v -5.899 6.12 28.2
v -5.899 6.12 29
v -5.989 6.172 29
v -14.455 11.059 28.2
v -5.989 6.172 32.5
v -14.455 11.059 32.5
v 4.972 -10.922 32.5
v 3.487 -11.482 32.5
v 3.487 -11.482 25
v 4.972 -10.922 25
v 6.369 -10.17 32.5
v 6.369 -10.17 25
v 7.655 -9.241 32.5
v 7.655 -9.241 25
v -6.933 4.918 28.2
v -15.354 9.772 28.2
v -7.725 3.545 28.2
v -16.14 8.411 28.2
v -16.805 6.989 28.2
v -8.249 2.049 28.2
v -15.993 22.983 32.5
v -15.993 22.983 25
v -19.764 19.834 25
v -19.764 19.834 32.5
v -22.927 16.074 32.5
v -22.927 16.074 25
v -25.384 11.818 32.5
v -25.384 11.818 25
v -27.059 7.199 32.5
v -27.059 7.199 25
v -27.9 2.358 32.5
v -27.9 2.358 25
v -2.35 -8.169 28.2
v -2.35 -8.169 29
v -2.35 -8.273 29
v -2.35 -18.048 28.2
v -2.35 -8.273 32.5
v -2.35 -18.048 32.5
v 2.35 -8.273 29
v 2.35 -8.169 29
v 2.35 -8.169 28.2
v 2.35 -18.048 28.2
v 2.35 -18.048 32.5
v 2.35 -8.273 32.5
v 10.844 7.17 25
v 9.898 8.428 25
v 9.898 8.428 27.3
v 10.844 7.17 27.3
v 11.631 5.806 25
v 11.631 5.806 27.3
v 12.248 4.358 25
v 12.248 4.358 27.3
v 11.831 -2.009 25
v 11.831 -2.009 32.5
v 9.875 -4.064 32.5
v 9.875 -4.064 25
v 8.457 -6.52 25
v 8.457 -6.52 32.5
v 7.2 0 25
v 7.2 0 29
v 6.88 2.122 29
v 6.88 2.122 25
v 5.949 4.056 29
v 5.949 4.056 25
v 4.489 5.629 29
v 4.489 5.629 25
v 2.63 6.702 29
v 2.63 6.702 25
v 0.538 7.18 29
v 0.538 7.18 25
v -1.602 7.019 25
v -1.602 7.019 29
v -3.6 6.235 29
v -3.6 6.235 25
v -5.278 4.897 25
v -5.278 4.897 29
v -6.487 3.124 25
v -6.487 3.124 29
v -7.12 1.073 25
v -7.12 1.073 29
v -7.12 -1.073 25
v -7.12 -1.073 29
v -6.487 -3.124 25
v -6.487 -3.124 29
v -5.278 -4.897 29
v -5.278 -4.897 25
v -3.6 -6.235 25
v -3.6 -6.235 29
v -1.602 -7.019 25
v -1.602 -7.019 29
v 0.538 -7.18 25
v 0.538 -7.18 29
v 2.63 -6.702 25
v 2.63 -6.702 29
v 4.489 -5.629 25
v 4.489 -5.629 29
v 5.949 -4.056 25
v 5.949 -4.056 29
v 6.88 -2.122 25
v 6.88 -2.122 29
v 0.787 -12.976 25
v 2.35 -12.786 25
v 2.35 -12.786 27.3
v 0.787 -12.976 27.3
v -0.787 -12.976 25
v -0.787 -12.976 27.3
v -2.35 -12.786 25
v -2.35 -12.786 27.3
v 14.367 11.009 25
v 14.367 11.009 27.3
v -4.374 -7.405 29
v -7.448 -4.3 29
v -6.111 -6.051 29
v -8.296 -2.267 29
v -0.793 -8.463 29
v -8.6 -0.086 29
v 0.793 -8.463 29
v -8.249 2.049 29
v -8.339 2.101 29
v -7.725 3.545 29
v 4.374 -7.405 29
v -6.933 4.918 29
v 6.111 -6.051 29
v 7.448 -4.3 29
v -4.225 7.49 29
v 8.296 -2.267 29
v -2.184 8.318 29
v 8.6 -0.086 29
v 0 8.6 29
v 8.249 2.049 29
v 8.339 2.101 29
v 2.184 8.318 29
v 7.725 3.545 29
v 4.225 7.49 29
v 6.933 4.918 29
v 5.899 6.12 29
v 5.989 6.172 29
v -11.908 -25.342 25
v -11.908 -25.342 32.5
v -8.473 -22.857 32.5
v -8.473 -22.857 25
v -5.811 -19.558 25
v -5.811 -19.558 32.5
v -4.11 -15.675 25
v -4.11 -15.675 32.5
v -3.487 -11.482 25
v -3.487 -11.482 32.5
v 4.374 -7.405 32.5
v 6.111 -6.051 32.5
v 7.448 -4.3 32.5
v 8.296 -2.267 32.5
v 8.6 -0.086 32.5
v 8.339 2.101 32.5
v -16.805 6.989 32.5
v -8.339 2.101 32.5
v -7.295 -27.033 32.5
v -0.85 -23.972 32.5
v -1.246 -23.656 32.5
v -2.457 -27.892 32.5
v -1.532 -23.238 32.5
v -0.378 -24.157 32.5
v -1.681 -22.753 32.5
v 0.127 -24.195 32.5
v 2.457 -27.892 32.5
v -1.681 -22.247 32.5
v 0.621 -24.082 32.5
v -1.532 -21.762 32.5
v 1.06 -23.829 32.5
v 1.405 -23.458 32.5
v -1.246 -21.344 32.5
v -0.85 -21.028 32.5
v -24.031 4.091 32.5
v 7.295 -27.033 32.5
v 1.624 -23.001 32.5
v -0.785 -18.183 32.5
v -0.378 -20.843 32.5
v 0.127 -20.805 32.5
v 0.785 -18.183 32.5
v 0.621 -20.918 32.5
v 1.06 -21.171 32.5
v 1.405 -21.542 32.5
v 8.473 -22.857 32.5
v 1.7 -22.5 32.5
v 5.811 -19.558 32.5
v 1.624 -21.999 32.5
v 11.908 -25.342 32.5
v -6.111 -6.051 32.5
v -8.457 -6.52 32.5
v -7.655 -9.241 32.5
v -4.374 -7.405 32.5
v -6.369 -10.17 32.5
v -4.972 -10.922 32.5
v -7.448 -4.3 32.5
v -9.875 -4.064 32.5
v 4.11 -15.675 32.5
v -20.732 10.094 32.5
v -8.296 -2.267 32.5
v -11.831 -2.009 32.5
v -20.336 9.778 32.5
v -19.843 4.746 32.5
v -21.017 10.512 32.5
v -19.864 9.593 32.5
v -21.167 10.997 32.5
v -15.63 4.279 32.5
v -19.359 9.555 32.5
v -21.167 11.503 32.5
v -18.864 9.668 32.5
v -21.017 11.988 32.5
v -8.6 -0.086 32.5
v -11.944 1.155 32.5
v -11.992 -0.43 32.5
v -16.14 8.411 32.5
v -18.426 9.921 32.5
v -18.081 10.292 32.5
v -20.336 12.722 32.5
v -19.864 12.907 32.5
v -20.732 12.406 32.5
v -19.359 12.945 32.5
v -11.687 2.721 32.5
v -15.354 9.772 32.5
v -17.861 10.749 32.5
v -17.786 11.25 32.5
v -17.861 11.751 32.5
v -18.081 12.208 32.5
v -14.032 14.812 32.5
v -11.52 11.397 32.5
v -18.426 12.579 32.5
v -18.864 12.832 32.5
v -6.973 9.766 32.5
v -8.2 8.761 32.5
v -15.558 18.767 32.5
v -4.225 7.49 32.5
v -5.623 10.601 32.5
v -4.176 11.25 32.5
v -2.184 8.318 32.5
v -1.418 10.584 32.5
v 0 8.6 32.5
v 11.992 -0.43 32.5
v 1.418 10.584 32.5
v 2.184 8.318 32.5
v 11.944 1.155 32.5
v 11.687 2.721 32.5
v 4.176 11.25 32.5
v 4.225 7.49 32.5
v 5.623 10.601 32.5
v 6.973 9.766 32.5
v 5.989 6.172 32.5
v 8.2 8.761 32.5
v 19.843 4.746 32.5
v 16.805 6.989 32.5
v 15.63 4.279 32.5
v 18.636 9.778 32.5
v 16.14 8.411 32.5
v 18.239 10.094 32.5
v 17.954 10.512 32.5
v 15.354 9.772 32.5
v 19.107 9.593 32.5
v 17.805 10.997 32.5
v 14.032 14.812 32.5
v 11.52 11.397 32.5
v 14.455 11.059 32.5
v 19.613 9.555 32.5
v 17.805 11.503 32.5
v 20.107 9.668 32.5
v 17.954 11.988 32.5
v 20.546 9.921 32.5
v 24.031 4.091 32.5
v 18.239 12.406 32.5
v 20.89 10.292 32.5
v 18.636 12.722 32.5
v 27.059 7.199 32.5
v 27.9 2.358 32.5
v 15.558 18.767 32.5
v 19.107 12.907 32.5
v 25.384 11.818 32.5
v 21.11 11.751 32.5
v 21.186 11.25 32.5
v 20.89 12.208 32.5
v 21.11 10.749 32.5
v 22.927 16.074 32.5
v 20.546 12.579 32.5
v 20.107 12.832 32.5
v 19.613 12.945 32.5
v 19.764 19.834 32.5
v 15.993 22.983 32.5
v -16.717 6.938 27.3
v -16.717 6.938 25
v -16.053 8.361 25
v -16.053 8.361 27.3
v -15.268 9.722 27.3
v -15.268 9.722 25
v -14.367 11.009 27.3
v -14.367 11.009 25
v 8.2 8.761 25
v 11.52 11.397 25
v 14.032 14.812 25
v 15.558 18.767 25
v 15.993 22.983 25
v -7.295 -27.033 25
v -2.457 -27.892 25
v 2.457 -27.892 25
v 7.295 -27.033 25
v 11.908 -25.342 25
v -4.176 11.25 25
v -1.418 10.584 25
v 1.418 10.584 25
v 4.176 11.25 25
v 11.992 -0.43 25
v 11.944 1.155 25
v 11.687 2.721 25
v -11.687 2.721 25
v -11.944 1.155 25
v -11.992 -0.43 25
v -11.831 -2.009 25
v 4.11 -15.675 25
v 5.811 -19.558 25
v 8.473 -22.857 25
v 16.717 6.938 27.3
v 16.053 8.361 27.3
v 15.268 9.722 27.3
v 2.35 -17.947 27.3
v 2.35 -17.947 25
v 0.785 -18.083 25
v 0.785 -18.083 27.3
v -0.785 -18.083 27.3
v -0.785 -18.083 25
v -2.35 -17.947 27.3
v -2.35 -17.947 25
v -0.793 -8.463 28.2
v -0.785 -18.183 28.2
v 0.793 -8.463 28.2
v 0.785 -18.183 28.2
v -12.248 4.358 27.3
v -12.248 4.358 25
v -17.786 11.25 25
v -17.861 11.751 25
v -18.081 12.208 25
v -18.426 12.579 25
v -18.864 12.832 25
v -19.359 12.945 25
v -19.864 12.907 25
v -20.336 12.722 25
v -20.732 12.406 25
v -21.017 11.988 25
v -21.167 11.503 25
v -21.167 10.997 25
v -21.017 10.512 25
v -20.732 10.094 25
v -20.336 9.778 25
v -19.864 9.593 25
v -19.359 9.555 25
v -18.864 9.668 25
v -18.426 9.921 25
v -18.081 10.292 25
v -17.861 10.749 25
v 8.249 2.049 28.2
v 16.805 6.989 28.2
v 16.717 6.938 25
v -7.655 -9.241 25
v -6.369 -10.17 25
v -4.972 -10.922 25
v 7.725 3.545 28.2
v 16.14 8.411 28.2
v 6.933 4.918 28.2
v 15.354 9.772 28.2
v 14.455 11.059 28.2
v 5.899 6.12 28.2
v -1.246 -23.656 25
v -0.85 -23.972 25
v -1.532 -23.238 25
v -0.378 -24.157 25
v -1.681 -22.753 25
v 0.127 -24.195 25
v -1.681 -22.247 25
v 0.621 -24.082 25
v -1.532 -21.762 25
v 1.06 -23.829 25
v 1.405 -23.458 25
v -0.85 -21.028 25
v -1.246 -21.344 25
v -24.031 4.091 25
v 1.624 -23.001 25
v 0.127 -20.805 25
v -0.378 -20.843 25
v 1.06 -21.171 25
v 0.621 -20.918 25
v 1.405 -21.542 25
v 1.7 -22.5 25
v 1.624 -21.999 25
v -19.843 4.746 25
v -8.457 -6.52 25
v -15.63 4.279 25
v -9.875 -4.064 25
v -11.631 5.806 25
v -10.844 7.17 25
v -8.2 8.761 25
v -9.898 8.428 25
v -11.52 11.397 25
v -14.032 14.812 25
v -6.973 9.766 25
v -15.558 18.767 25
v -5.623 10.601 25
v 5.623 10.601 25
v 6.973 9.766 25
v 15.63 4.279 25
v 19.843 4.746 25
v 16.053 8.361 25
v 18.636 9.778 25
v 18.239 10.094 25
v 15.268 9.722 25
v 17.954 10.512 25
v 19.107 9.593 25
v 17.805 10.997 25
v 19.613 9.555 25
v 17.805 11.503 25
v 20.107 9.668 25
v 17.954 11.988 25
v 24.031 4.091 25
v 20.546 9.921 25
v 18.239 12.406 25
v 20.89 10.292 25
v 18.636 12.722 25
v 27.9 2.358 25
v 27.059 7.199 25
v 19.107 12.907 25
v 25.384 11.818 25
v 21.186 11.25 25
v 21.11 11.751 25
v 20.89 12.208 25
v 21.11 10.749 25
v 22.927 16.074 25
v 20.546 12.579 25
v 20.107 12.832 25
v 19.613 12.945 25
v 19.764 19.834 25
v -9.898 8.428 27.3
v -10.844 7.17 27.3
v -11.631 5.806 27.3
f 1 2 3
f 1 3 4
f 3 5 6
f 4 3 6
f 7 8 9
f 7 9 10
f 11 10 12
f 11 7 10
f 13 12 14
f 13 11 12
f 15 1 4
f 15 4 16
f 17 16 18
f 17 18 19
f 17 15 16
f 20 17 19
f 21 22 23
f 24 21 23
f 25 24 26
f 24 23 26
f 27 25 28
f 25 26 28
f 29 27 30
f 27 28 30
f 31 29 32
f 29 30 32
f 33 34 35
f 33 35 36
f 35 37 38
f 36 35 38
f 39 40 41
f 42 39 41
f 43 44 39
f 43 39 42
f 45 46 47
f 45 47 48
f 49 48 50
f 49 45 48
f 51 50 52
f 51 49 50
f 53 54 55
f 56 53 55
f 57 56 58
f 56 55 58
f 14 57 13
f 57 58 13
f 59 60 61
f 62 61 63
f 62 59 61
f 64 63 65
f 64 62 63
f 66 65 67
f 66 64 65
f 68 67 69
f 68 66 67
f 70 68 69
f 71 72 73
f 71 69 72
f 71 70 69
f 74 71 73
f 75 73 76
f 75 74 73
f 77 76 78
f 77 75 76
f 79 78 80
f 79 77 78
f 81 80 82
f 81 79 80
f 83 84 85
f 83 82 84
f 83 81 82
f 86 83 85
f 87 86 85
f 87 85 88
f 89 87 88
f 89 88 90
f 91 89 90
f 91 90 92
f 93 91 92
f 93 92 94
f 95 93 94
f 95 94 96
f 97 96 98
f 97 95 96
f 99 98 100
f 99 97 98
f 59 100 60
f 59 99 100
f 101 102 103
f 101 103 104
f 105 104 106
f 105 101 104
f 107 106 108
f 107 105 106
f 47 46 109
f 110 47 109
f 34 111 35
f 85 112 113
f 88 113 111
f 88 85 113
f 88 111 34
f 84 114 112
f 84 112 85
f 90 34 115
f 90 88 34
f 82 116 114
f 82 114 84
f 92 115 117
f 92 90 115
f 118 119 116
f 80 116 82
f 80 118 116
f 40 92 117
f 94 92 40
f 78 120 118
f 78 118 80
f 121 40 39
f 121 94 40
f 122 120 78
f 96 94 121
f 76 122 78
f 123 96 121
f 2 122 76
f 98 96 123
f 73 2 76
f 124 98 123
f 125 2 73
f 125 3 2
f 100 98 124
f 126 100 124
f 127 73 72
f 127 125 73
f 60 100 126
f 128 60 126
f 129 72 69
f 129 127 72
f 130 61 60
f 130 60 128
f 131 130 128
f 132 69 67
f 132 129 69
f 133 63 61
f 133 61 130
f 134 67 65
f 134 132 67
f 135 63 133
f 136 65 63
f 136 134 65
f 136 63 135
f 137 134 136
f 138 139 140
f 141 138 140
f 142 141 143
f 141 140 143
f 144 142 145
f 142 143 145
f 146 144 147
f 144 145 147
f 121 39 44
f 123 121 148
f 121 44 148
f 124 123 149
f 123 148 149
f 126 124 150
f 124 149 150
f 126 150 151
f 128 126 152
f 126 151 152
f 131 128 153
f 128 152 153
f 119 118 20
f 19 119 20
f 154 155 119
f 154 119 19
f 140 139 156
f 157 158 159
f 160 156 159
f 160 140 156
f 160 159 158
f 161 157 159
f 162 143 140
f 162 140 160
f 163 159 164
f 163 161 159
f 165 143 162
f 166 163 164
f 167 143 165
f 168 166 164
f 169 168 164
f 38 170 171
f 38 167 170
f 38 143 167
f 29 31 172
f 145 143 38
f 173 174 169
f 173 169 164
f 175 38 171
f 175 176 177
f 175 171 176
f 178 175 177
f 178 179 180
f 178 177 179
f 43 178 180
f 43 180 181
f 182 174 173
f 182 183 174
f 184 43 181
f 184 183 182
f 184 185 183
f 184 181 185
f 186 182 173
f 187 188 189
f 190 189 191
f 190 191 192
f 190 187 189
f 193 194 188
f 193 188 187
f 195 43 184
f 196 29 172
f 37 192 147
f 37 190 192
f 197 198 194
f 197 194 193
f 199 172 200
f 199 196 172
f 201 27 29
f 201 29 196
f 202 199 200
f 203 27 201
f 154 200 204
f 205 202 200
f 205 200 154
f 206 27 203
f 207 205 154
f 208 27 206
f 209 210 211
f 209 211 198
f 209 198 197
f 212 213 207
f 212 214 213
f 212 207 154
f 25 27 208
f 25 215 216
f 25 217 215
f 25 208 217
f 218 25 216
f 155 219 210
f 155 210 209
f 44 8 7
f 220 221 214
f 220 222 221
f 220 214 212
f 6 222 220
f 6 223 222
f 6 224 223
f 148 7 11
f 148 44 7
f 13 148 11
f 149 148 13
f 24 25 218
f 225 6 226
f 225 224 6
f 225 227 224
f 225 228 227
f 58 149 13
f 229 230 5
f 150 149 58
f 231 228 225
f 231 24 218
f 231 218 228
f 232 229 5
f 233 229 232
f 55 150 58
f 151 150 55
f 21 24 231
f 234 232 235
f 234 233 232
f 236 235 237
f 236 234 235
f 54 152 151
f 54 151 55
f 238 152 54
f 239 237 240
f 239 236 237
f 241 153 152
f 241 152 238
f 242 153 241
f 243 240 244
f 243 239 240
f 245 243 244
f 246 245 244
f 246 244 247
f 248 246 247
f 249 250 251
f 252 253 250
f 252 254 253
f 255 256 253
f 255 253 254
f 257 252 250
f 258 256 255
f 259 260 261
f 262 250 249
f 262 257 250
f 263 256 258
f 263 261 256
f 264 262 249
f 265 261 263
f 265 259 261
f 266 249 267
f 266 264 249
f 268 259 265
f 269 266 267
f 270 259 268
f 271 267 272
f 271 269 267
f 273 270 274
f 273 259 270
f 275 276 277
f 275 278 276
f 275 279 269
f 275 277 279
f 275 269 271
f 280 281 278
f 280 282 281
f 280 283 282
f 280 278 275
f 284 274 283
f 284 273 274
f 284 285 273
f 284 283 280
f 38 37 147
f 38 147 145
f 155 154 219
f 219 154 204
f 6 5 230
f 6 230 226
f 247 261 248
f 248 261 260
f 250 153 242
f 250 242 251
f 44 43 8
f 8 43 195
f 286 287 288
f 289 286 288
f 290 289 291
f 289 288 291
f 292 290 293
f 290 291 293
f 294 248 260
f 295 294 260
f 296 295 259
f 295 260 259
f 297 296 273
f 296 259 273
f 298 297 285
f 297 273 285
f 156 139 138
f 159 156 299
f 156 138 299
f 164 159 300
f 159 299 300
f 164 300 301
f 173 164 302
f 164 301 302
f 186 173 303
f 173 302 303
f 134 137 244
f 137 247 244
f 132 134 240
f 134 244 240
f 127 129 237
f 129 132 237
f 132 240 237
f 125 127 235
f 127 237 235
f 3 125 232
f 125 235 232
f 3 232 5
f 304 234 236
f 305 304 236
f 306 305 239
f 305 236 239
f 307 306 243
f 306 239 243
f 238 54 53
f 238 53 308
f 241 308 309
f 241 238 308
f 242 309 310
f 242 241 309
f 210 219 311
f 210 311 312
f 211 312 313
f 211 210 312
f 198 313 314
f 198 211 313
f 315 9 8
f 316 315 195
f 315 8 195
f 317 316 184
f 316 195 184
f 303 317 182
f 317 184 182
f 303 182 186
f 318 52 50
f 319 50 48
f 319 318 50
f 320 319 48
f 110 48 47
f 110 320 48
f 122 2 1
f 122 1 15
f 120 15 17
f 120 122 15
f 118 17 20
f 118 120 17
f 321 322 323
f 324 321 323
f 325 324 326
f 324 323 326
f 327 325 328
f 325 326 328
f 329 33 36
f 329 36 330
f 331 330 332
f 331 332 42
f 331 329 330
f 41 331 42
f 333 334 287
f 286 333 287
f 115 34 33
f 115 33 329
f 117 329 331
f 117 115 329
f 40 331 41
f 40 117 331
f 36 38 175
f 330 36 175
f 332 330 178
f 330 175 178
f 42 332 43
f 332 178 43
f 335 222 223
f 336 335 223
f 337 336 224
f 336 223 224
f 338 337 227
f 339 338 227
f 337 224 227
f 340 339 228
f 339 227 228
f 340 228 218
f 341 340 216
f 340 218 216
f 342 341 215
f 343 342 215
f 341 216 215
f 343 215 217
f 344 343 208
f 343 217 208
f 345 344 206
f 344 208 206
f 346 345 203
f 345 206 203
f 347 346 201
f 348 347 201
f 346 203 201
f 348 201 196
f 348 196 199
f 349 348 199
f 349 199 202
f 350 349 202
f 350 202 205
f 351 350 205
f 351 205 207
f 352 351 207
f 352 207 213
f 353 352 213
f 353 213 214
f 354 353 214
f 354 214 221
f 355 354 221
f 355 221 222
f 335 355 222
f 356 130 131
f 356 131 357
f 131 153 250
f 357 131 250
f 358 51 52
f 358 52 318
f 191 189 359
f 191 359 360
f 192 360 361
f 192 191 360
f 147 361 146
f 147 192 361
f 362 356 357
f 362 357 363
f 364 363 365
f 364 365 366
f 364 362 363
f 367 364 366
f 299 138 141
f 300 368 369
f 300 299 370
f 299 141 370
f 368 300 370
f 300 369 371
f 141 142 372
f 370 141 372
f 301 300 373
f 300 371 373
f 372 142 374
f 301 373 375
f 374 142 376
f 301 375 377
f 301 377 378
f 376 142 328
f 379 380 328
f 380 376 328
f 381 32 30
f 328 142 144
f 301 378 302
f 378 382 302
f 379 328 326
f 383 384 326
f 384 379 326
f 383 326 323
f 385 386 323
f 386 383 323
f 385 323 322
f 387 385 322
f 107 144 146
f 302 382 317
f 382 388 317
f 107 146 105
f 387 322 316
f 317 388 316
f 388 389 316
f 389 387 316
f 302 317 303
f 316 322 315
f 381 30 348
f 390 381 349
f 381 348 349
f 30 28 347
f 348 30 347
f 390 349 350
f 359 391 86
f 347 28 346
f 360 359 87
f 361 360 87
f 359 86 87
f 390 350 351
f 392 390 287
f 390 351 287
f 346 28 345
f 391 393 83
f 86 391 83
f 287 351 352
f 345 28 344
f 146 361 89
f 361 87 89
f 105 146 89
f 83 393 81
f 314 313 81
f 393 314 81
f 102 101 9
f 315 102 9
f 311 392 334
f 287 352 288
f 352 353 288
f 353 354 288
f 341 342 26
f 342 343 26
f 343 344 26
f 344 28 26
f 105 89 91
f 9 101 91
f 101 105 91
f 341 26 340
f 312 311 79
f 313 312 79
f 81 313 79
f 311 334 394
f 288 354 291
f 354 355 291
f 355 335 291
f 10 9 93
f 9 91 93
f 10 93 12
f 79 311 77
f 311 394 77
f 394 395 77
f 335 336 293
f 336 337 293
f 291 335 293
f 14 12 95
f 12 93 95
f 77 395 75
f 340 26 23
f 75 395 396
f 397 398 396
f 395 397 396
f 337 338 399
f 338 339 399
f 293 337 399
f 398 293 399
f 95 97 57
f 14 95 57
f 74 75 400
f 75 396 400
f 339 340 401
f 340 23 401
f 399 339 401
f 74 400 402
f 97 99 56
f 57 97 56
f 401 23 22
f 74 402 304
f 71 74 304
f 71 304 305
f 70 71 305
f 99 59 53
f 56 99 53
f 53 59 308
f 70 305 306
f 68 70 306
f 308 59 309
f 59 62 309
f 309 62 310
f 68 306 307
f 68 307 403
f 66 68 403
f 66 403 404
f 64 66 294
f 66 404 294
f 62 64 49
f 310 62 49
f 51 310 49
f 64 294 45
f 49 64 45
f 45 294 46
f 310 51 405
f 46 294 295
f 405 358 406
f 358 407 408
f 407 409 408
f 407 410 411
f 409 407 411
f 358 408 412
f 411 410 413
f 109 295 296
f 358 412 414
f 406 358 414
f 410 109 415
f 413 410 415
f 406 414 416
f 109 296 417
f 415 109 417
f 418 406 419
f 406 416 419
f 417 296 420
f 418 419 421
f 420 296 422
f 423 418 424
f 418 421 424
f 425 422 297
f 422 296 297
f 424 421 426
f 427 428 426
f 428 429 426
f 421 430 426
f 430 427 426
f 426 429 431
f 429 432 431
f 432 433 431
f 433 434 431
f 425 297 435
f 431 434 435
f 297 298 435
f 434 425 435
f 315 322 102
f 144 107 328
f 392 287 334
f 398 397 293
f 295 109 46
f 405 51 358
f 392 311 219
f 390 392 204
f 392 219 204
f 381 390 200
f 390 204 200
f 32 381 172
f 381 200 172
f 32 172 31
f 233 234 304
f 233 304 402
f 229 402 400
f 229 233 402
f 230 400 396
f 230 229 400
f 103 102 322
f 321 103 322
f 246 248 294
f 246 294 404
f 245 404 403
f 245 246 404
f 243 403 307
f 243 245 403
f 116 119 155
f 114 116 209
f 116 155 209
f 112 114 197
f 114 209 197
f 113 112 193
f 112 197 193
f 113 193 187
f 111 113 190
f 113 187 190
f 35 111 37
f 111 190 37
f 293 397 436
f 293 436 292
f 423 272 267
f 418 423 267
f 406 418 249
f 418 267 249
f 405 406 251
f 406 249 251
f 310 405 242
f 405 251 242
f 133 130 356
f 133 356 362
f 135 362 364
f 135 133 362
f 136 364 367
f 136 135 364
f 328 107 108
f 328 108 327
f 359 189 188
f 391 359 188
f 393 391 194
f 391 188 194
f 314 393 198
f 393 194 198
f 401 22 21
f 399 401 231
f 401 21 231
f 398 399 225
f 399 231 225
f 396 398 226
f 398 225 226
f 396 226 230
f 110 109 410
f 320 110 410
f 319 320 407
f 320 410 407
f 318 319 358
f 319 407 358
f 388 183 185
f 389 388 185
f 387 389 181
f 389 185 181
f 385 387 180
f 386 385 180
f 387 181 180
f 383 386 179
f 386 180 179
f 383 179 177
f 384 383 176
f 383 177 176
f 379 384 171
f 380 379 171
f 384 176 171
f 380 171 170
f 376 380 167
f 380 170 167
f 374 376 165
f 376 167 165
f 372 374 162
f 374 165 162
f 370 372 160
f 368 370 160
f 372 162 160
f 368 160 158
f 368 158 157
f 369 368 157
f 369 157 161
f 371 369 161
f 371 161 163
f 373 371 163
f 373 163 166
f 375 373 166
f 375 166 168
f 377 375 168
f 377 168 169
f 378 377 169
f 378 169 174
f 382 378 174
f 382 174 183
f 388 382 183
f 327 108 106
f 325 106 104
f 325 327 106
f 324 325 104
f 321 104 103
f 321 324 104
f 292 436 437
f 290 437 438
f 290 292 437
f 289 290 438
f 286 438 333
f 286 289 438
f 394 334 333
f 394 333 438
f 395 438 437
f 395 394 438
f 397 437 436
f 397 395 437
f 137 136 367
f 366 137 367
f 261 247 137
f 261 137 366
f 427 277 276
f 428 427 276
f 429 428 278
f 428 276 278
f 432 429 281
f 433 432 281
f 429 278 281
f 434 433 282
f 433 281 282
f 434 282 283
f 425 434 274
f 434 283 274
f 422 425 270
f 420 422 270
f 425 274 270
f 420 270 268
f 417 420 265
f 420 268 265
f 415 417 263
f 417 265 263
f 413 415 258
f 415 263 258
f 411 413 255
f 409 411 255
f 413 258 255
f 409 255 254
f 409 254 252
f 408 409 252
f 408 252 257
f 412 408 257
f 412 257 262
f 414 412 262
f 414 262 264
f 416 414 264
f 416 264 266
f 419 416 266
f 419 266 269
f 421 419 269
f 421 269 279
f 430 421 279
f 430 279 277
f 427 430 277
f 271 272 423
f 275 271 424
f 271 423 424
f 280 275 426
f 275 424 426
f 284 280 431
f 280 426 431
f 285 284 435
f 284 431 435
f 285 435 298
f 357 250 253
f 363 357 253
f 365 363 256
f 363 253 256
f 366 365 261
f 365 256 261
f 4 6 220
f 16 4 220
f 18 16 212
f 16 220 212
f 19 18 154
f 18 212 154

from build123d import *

# Parameters (mm, degrees)
SKETCH_R              = 28
SKETCH_R_2            = 7.2
PAD_DEPTH             = 7.5
POCKET_DEPTH          = 166.601597
POLARPATTERN_COUNT    = 3
SKETCH003_R           = 1.7
POCKET001_DEPTH       = 7.501
SKETCH007_R           = 8.6
POCKET005_DEPTH       = 3.5
POCKET006_DEPTH       = 4.3
POLARPATTERN001_COUNT = 3
POCKET007_DEPTH       = 2.3
POLARPATTERN002_COUNT = 3


with BuildPart() as part:
    # Sketch → Pad (new body)
    with BuildSketch(Plane.XY.offset(25)):
        Circle(SKETCH_R)
        Circle(SKETCH_R_2, mode=Mode.SUBTRACT)
    extrude(amount=PAD_DEPTH)

    # Sketch002 → Pocket (cut, through all)
    with BuildSketch(Plane.XY.offset(32.5)):
        with BuildLine():
            ThreePointArc((-4.175823, 11.25), (0, 10.5), (4.175823, 11.25))
            ThreePointArc((8.200179, 8.761111), (6.311893, 10.205881), (4.175823, 11.25))
            ThreePointArc((8.200179, 8.761111), (0, 38.5), (-8.200179, 8.761111))
            ThreePointArc((-4.175823, 11.25), (-6.311893, 10.205881), (-8.200179, 8.761111))
        make_face()
    pocket = extrude(amount=-POCKET_DEPTH, mode=Mode.SUBTRACT)

    # PolarPattern: Pocket ×3 about axis
    polarpattern_axis = Axis((0, 0, 32.5), (0, 0, 1))
    for i in range(1, POLARPATTERN_COUNT):
        add(pocket.rotate(polarpattern_axis, i * 360 / POLARPATTERN_COUNT), mode=Mode.SUBTRACT)

    # Sketch003 → Pocket001 (cut, through all)
    with BuildSketch(Plane.XY.offset(32.5)):
        with Locations((0, 22.5)):
            Circle(SKETCH003_R)
        with Locations((-19.485572, -11.25)):
            Circle(SKETCH003_R)
        with Locations((19.485572, -11.25)):
            Circle(SKETCH003_R)
        with Locations((-19.485572, 11.25)):
            Circle(SKETCH003_R)
        with Locations((19.485572, 11.25)):
            Circle(SKETCH003_R)
        with Locations((0, -22.5)):
            Circle(SKETCH003_R)
    extrude(amount=-POCKET001_DEPTH, mode=Mode.SUBTRACT)

    # Sketch007 → Pocket005 (cut)
    with BuildSketch(Plane.XY.offset(32.5)):
        Circle(SKETCH007_R)
    extrude(amount=-POCKET005_DEPTH, mode=Mode.SUBTRACT)

    # Sketch005 → Pocket006 (cut)
    with BuildSketch(Plane.XY.offset(32.5)):
        with BuildLine():
            Line((-2.35, -8.16869), (-2.35, -18.047645))
            ThreePointArc((-2.35, -18.047645), (0, -18.2), (2.35, -18.047645))
            Line((2.35, -8.16869), (2.35, -18.047645))
            ThreePointArc((-2.35, -8.16869), (0, -8.5), (2.35, -8.16869))
        make_face()
    pocket006 = extrude(amount=-POCKET006_DEPTH, mode=Mode.SUBTRACT)

    # PolarPattern001: Pocket006 ×3 about axis
    polarpattern001_axis = Axis((0, 0, 32.5), (0, 0, 1))
    for i in range(1, POLARPATTERN001_COUNT):
        add(pocket006.rotate(polarpattern001_axis, i * 360 / POLARPATTERN001_COUNT), mode=Mode.SUBTRACT)

    # Sketch009 → Pocket007 (cut)
    with BuildSketch(Plane(origin=(0, 0, 25), x_dir=(1, 0, 0), z_dir=(0, 0, -1))):
        with BuildLine():
            Line((2.35, 12.785832), (2.35, 17.946796))
            ThreePointArc((2.35, 17.946796), (0, 18.1), (-2.35, 17.946796))
            Line((-2.35, 12.785832), (-2.35, 17.946796))
            ThreePointArc((2.35, 12.785832), (0, 13), (-2.35, 12.785832))
        make_face()
    pocket007 = extrude(amount=-POCKET007_DEPTH, mode=Mode.SUBTRACT)

    # PolarPattern002: Pocket007 ×3 about axis
    polarpattern002_axis = Axis((0, 0, 25), (0, 0, -1))
    for i in range(1, POLARPATTERN002_COUNT):
        add(pocket007.rotate(polarpattern002_axis, i * 360 / POLARPATTERN002_COUNT), mode=Mode.SUBTRACT)


solid = part.part
